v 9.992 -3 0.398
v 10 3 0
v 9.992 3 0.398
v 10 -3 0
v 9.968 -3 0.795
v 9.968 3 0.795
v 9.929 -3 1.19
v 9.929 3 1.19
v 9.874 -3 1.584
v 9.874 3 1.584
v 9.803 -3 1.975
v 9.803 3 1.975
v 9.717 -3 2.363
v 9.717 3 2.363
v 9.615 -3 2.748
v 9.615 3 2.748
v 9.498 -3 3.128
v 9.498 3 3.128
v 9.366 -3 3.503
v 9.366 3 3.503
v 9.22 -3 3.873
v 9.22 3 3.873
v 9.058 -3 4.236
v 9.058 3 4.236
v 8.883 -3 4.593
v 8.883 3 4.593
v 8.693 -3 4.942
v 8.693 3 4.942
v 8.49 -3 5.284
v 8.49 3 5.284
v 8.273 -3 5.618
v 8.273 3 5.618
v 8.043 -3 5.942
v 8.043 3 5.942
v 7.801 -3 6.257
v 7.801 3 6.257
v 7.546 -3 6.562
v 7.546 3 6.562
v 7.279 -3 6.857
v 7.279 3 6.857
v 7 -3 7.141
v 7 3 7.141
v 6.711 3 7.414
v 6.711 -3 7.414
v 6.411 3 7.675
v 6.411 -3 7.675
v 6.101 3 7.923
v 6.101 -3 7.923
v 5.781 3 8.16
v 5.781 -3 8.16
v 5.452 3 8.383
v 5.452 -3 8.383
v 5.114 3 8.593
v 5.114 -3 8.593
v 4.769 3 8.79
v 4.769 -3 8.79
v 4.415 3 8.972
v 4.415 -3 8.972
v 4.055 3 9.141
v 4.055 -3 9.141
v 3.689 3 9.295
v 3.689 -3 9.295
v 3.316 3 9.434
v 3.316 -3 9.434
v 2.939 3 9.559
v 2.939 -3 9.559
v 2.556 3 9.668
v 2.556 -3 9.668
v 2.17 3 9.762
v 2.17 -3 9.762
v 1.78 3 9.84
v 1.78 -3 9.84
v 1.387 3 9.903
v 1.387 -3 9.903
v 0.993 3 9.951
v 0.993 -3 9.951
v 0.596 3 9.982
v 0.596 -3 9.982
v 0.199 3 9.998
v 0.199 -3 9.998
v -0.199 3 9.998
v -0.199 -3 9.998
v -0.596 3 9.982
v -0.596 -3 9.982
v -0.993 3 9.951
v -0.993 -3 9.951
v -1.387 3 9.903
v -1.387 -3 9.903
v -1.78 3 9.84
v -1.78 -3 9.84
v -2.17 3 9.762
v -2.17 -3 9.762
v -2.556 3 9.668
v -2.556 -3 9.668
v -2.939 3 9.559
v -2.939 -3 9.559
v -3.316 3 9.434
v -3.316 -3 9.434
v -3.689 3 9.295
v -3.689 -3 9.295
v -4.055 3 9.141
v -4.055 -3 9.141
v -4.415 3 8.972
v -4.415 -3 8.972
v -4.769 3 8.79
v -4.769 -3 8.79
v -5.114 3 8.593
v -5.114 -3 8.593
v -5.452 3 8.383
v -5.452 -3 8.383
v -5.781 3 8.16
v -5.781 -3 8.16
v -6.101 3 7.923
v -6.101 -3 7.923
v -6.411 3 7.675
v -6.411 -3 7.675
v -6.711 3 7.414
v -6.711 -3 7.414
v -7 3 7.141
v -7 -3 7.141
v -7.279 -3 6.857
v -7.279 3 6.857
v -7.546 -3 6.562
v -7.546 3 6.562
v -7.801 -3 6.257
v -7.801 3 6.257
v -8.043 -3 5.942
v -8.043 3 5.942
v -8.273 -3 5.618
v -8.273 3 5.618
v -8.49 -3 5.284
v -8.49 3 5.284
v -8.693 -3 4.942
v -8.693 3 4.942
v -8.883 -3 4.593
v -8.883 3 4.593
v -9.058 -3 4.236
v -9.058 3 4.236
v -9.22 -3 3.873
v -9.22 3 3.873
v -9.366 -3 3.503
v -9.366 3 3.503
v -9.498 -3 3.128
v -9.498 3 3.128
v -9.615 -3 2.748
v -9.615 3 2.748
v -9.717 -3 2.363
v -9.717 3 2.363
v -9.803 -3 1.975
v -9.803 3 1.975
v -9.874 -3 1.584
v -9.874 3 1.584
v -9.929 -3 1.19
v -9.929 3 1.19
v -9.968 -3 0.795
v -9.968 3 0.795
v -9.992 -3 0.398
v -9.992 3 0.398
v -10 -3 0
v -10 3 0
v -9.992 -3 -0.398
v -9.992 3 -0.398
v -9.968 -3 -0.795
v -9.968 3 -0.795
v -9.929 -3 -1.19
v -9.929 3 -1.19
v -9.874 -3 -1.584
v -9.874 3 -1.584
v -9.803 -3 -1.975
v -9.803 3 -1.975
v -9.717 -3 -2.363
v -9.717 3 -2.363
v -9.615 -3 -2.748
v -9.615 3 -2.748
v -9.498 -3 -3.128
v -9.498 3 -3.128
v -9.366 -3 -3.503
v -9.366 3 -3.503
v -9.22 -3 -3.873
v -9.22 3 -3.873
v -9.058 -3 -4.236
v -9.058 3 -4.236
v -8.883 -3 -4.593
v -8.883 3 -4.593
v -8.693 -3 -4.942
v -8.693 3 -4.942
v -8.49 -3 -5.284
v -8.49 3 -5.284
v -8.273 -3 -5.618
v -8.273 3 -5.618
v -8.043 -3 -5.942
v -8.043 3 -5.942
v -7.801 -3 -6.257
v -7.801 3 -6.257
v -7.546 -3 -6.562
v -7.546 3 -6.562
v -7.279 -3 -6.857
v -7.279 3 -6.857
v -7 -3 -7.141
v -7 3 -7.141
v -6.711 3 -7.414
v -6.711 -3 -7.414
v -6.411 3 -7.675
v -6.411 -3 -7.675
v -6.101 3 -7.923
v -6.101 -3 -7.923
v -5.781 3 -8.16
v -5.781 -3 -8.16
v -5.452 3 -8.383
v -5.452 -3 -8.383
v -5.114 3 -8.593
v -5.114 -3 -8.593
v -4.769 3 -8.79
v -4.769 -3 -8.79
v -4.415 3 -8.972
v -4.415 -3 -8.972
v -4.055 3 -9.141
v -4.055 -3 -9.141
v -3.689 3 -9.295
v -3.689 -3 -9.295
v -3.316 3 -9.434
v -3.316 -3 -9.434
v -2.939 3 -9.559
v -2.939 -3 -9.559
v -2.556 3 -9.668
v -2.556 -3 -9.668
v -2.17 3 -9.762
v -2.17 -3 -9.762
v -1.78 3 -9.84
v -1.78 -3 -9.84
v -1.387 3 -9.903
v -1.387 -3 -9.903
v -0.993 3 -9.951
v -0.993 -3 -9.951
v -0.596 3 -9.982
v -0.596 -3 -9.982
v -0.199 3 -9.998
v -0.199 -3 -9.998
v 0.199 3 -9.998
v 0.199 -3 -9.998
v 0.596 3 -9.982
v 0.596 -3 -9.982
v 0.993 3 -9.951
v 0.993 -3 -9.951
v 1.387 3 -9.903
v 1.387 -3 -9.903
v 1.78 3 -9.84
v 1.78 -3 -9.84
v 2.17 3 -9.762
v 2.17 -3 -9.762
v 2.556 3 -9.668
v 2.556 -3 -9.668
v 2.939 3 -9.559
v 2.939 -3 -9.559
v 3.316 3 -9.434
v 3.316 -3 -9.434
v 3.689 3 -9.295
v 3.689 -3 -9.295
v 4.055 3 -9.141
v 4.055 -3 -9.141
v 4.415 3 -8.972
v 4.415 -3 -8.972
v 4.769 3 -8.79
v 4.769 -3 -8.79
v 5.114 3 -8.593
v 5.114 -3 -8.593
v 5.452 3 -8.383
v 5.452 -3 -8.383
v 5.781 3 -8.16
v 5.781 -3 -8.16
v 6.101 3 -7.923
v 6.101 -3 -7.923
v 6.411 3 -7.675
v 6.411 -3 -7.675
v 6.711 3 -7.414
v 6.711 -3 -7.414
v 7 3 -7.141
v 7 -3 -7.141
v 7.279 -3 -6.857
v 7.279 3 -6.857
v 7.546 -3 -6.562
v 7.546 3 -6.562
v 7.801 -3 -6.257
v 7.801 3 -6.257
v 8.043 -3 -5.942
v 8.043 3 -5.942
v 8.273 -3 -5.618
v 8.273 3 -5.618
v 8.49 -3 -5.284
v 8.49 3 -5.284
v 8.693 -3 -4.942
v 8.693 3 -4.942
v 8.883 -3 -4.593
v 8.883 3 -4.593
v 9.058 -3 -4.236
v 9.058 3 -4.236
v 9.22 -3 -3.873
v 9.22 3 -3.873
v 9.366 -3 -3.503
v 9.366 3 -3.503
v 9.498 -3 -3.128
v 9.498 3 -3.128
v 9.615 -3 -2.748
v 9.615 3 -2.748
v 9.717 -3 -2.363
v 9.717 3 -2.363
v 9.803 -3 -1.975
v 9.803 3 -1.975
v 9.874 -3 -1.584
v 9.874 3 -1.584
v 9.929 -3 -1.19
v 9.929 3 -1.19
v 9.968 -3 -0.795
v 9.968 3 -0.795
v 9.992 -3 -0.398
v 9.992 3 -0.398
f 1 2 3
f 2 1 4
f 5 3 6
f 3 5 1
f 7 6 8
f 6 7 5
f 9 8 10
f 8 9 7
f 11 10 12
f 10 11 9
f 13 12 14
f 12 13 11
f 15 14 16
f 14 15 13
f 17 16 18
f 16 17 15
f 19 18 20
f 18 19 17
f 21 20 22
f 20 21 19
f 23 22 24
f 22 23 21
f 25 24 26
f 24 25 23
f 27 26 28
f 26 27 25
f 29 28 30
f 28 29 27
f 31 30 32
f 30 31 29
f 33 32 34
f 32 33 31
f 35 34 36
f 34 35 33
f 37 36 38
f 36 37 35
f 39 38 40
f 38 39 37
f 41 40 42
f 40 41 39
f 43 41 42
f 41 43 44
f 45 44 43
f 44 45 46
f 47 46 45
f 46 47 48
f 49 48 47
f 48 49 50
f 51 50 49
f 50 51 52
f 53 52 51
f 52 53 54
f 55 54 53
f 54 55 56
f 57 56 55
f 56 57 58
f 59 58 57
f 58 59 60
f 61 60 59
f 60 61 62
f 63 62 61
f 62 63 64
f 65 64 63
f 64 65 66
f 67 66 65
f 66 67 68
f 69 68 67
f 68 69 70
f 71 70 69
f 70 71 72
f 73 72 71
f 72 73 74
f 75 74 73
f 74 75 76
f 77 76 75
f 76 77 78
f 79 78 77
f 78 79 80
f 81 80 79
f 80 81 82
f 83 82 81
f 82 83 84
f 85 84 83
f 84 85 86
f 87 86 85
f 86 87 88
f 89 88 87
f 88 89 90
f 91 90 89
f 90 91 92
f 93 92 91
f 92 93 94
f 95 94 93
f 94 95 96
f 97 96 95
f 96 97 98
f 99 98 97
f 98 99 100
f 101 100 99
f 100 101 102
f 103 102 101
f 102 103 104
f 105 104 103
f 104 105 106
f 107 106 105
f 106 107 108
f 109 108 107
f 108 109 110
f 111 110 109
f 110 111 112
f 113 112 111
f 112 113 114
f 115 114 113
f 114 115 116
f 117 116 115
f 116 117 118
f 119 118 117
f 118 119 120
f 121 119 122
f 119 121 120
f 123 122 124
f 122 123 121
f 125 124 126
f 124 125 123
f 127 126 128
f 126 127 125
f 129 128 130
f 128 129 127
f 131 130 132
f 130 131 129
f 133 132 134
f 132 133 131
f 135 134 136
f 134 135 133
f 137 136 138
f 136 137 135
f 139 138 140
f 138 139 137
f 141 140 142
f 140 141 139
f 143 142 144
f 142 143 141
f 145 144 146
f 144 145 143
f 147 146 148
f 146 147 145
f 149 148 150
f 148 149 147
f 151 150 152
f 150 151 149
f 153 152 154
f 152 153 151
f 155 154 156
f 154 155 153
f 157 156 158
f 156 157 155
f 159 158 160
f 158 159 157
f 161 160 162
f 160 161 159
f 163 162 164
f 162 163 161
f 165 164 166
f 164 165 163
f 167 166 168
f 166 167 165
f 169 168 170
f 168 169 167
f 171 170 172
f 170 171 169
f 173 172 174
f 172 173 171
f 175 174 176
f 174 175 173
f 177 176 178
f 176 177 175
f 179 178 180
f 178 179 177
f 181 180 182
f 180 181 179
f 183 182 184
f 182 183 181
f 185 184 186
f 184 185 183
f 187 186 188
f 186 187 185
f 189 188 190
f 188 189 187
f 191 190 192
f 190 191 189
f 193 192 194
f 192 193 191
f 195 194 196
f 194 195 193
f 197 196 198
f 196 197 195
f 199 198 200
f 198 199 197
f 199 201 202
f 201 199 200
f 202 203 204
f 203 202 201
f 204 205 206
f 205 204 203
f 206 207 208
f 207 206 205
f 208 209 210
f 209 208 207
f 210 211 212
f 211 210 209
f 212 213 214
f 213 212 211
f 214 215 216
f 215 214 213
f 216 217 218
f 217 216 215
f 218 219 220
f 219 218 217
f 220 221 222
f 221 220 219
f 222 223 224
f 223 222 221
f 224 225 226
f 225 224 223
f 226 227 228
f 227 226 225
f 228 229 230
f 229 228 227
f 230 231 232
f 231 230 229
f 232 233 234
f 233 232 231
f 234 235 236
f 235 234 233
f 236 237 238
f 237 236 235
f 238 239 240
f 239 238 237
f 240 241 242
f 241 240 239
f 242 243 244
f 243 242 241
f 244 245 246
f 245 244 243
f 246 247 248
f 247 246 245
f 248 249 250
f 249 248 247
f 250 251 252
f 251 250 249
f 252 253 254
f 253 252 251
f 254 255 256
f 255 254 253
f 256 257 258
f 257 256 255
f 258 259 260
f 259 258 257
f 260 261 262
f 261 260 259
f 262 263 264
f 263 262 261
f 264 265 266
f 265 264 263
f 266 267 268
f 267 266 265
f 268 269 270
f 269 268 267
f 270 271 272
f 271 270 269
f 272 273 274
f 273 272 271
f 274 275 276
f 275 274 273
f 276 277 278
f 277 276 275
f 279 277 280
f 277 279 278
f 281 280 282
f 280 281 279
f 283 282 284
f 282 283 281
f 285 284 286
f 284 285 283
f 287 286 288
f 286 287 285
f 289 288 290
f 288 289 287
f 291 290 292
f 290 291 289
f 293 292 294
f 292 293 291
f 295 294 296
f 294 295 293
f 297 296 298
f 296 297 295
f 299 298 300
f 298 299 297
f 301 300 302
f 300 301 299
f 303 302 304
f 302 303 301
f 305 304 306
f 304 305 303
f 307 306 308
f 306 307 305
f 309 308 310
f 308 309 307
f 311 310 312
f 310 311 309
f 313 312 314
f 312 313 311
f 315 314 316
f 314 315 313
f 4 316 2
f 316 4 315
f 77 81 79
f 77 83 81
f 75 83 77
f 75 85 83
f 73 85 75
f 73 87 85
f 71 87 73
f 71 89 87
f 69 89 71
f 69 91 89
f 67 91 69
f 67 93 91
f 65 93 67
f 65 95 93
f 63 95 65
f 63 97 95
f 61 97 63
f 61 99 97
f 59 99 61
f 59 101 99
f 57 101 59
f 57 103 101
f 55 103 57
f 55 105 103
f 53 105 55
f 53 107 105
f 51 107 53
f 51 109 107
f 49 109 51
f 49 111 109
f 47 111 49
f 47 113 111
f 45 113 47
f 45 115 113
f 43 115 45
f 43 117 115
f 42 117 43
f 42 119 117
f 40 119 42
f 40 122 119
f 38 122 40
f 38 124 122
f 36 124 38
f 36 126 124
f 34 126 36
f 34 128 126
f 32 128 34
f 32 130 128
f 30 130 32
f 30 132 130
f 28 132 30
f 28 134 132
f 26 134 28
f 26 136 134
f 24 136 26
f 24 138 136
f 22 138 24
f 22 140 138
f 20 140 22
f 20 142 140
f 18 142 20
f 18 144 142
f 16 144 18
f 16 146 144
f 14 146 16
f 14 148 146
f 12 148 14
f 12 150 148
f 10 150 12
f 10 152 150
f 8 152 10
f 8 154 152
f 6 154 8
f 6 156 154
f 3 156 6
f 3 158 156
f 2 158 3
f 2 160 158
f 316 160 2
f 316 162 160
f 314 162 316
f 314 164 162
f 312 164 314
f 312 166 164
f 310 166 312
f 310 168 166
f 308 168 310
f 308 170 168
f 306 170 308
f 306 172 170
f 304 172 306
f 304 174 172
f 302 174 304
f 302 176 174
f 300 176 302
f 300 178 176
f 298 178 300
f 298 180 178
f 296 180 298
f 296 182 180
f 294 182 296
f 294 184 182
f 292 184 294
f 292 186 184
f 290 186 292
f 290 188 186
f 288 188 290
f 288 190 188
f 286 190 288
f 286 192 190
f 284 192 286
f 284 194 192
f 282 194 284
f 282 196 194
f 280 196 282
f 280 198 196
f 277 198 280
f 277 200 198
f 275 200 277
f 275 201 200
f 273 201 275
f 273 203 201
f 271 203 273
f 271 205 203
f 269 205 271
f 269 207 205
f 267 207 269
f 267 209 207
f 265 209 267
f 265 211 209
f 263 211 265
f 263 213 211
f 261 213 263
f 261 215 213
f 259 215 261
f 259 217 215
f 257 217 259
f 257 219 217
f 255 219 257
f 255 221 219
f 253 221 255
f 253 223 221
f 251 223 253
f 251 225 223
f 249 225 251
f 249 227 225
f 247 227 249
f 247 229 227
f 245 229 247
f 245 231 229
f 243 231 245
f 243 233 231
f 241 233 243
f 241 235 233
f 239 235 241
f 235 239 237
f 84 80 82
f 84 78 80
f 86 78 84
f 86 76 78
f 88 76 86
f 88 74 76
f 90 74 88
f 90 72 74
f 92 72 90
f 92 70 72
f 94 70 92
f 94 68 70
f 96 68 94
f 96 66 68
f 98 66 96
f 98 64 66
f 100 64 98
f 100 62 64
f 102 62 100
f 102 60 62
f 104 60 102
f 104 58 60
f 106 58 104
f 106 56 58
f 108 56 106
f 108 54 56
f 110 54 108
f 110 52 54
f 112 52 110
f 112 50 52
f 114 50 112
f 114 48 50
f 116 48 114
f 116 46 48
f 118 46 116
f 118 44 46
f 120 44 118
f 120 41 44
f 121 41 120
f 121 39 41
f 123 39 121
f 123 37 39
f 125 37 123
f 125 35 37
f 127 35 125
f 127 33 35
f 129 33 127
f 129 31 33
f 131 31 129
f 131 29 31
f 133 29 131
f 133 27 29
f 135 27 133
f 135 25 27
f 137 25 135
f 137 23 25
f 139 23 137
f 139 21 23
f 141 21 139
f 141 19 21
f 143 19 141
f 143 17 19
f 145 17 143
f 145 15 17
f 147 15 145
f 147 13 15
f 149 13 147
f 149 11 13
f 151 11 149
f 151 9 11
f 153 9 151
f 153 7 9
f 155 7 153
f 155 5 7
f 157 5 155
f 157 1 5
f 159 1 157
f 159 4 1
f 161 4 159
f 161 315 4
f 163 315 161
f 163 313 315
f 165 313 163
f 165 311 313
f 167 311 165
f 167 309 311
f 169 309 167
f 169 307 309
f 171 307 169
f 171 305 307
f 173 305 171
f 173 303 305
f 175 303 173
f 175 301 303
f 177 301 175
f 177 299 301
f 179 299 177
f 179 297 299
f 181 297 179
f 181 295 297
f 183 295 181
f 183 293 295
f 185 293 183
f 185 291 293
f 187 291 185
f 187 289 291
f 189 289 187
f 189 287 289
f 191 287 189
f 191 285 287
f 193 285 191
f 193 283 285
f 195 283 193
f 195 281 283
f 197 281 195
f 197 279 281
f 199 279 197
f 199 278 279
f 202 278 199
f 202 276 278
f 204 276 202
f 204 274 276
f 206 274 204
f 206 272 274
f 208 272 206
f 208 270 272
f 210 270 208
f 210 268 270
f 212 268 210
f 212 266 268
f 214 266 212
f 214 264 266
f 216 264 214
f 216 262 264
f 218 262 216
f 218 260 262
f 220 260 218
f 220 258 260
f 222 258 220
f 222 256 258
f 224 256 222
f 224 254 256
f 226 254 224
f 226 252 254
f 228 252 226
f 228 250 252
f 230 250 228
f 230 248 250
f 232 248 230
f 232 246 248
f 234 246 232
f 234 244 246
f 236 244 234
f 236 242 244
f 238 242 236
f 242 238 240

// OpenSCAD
$fa = 1;
$fs = 0.4;
module simple_wheel(wheel_radius=10, wheel_width=6) {
    rotate([90,0,0])
        cylinder(h=wheel_width,r=wheel_radius,center=true);
}
simple_wheel();
